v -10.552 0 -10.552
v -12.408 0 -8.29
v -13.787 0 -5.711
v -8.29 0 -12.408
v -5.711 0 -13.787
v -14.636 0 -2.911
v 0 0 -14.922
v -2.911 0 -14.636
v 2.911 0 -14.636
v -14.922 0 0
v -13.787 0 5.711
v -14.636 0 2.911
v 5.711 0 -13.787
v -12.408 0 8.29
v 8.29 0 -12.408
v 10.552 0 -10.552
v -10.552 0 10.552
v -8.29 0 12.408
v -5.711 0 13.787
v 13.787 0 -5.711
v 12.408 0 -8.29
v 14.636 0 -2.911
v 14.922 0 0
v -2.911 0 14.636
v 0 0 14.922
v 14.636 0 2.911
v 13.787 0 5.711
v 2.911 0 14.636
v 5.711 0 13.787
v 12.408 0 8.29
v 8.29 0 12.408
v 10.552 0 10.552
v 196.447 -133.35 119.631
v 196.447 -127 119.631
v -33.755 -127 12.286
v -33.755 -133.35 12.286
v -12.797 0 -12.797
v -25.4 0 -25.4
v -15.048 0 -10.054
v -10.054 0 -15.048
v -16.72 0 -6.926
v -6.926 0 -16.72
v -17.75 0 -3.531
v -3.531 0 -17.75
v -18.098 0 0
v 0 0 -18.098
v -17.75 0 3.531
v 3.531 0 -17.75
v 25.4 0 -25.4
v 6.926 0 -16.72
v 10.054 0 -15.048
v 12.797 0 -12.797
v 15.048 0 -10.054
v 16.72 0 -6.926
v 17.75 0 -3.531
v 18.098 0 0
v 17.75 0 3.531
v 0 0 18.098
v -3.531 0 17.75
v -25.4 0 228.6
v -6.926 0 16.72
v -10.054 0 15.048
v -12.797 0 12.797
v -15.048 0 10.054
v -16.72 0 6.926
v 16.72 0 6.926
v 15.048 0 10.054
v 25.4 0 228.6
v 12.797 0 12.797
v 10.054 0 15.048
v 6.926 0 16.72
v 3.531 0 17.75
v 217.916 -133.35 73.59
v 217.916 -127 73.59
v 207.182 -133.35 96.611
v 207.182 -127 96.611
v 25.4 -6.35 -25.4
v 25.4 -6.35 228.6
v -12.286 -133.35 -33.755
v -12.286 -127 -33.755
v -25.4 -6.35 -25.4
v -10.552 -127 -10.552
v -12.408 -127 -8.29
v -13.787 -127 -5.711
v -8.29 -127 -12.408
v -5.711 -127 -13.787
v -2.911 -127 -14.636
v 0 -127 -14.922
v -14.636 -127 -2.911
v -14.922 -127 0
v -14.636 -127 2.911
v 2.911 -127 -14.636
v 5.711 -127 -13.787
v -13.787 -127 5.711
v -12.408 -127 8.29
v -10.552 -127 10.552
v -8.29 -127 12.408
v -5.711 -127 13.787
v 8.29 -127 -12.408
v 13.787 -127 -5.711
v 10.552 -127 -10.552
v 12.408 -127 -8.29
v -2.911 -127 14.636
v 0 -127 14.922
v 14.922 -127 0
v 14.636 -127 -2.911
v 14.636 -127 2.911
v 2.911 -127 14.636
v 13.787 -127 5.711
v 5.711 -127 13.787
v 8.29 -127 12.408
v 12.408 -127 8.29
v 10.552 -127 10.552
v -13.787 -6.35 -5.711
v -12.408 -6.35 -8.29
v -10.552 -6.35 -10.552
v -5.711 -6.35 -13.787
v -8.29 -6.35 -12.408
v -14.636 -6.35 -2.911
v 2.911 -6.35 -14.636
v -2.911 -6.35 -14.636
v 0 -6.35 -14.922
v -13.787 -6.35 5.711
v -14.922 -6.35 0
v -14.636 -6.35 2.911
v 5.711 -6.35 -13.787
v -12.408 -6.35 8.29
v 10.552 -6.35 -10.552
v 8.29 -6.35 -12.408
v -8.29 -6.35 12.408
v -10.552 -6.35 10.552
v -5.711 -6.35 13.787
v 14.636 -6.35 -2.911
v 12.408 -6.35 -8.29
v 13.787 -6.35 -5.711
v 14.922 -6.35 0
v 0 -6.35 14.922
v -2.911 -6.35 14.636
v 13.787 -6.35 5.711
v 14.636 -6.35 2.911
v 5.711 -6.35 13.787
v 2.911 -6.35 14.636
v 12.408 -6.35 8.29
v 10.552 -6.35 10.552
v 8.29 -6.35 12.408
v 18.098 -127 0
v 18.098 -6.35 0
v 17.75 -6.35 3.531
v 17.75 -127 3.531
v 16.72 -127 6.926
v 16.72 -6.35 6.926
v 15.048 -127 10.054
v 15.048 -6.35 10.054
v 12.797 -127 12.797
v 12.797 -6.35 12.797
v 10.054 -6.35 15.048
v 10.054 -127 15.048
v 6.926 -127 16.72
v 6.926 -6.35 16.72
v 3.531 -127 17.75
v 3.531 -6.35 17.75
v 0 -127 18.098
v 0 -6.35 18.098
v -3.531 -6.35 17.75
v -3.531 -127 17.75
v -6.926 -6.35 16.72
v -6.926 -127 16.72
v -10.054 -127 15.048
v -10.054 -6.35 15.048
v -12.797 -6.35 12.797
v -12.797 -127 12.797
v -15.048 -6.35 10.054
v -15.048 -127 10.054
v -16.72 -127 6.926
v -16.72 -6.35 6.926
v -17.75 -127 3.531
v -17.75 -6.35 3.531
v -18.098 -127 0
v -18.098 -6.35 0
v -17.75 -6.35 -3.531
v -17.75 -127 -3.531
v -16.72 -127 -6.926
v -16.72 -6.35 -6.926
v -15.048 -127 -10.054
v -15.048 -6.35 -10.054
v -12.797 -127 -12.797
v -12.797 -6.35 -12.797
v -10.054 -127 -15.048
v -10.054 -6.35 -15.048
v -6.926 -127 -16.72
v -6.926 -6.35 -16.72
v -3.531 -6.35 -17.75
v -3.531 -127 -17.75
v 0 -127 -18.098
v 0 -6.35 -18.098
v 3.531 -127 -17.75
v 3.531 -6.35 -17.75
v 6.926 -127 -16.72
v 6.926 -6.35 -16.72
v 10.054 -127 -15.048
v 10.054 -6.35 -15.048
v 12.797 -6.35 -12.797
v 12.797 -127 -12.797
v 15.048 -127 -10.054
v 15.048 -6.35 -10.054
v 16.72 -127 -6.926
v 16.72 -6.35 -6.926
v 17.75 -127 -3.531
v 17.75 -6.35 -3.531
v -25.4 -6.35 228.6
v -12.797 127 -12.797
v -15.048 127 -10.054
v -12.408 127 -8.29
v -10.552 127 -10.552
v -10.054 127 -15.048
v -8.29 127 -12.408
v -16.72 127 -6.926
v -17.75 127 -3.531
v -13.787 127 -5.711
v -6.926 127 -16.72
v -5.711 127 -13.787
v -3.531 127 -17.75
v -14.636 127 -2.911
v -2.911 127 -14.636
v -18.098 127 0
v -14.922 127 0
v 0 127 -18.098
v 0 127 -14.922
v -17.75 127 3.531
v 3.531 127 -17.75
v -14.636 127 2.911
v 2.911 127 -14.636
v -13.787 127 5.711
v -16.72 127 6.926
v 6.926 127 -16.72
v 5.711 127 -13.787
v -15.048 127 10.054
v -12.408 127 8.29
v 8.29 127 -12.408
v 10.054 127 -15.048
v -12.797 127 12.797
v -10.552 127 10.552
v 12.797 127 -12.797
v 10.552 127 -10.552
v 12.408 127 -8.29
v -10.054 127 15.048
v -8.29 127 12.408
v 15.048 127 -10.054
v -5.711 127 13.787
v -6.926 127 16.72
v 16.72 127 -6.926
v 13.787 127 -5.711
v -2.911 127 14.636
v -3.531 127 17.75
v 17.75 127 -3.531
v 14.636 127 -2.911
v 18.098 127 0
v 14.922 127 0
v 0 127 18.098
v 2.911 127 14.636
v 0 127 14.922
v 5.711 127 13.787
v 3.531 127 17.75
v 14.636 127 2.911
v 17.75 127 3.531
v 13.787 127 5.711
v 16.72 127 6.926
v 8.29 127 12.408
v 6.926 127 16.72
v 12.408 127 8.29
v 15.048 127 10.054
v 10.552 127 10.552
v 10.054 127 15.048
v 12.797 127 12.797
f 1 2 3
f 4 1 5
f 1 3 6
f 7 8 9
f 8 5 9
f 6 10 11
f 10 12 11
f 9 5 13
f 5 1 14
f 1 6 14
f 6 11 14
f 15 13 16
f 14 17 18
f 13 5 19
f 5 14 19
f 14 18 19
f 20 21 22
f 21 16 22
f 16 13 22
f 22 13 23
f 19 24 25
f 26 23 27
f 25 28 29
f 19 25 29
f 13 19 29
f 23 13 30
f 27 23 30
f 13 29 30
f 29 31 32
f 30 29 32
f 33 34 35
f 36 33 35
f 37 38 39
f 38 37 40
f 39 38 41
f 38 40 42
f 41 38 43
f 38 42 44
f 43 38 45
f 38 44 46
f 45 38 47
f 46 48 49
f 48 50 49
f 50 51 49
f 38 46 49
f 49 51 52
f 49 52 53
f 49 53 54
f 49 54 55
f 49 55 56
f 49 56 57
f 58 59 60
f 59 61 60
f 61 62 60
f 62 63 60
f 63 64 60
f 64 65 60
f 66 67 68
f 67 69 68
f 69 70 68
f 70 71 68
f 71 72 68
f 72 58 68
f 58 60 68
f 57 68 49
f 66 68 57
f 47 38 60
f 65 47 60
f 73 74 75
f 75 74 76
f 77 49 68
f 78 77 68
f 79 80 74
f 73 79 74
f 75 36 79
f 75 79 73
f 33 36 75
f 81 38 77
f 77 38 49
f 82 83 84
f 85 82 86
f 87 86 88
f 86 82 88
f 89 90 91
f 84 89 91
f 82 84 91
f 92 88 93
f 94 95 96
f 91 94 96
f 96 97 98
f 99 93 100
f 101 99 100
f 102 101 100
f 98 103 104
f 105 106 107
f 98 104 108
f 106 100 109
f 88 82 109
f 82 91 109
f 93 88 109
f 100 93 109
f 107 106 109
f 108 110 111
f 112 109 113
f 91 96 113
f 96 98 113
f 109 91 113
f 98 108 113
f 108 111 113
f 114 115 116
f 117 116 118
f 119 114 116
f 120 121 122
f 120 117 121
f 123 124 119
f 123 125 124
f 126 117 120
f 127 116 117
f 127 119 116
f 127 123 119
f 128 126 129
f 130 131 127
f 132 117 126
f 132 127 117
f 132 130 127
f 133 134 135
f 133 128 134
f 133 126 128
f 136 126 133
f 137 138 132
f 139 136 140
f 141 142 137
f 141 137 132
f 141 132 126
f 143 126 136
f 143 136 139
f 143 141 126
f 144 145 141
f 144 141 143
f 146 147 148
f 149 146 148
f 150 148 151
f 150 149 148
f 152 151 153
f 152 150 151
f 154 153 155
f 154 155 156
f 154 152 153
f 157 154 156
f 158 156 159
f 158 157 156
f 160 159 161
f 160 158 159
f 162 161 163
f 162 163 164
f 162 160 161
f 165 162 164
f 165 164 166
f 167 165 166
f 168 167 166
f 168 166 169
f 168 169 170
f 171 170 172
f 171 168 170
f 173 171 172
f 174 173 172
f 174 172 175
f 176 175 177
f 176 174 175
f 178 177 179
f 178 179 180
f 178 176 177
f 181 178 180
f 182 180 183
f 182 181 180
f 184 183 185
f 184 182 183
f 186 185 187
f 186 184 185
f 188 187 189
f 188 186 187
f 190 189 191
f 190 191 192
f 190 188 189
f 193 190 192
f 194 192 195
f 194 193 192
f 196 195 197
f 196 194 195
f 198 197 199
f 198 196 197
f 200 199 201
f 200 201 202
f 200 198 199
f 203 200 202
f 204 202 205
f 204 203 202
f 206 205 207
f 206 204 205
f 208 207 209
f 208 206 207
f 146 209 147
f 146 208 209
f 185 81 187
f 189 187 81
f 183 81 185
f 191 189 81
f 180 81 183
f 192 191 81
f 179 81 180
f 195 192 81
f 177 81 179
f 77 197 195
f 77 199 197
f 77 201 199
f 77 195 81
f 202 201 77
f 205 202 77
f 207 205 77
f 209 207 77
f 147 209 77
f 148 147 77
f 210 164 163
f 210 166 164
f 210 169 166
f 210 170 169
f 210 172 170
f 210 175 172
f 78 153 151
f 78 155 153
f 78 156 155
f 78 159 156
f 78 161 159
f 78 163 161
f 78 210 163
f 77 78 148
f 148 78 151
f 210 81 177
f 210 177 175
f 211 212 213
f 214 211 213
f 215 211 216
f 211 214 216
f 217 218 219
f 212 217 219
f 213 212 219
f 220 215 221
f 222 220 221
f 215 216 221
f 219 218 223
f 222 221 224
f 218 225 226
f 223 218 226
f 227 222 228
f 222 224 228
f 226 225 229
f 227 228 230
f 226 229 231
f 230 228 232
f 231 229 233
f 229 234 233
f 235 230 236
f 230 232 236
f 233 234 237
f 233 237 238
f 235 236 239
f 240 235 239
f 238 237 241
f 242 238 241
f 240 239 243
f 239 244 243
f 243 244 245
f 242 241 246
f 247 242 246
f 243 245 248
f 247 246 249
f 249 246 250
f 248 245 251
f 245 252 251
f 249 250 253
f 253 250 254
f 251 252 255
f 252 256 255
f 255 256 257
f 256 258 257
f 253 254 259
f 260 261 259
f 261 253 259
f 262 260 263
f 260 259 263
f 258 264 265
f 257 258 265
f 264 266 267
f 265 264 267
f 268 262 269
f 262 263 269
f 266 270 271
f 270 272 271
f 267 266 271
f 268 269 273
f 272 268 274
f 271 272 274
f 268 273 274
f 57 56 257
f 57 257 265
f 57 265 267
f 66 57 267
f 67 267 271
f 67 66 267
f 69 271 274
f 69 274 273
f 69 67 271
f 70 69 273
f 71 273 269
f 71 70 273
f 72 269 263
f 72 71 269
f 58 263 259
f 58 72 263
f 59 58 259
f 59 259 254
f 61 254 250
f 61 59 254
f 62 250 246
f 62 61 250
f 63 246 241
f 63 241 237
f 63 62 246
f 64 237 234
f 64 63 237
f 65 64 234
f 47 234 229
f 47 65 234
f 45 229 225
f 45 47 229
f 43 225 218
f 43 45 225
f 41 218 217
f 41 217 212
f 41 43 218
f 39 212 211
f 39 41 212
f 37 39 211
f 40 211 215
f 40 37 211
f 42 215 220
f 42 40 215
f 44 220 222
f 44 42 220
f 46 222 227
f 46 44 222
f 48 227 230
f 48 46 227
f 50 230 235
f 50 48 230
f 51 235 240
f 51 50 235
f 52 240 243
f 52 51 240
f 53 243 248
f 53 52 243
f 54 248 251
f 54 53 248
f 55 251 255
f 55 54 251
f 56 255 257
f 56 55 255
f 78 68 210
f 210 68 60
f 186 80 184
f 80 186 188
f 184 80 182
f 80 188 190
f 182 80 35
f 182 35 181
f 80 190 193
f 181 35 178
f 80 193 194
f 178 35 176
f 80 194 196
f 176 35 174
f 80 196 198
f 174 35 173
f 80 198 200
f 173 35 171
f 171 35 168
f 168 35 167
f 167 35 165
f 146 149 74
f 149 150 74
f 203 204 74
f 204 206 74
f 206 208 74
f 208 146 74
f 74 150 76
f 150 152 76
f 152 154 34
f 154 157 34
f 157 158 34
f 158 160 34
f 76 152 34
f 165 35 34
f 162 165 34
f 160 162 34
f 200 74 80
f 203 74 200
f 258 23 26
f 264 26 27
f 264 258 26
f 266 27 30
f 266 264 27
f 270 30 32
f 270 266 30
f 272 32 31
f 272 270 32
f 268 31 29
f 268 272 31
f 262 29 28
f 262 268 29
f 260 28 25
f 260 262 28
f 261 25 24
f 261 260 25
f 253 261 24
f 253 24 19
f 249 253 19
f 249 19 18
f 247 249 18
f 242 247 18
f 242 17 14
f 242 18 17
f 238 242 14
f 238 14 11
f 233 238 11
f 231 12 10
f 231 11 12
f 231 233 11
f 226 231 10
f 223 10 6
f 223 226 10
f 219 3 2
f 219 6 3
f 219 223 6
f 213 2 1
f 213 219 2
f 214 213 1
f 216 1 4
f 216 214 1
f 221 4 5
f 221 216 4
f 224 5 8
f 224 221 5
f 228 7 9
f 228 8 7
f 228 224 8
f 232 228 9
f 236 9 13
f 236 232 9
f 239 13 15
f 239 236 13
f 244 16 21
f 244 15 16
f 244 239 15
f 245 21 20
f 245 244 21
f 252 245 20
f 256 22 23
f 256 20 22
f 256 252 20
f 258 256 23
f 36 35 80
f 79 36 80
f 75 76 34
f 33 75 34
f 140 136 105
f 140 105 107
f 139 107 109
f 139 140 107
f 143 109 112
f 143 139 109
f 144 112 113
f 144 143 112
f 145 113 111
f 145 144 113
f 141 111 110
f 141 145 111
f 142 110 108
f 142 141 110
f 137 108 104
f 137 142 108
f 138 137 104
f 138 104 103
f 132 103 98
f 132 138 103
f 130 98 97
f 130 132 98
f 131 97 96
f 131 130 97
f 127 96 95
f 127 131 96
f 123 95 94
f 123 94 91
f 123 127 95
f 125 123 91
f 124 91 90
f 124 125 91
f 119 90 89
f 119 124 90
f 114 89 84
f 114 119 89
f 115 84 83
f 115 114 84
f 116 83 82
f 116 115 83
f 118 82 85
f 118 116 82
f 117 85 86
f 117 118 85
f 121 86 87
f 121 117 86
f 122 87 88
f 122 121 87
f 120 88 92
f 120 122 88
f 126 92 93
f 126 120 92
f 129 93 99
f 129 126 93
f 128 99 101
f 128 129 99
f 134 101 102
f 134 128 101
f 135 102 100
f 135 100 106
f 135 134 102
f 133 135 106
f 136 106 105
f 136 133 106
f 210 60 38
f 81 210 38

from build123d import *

# Parameters (mm, degrees)
F0_R     = 18.0975
F0_R_2   = 14.9225
F1_DEPTH = 127
F3_DEPTH = 6.35
F5_DEPTH = 6.35


with BuildPart() as f1:
    # F0 (on Front) → F1 (new body, symmetric)
    with BuildSketch(Plane.XZ):
        Circle(F0_R)
        Circle(F0_R_2, mode=Mode.SUBTRACT)
    extrude(amount=F1_DEPTH, both=True)

    # F2 (on Front) → F3 (join)
    with BuildSketch(Plane.XZ):
        Polygon((0, -25.4), (25.4, -25.4), (25.4, 228.6), (0, 228.6), (-25.4, 228.6), (-25.4, -25.4), align=None)
    extrude(amount=F3_DEPTH)

    # F4 (on face) → F5 (join)
    with BuildSketch(Plane.XZ.offset(127)):
        Polygon((217.916464, 73.590317), (207.18196, 96.610535), (196.447456, 119.630752), (-33.754722, 12.285714), (-23.020218, -10.734504), (-12.285714, -33.754722), align=None)
    extrude(amount=F5_DEPTH)


solid = f1.part
